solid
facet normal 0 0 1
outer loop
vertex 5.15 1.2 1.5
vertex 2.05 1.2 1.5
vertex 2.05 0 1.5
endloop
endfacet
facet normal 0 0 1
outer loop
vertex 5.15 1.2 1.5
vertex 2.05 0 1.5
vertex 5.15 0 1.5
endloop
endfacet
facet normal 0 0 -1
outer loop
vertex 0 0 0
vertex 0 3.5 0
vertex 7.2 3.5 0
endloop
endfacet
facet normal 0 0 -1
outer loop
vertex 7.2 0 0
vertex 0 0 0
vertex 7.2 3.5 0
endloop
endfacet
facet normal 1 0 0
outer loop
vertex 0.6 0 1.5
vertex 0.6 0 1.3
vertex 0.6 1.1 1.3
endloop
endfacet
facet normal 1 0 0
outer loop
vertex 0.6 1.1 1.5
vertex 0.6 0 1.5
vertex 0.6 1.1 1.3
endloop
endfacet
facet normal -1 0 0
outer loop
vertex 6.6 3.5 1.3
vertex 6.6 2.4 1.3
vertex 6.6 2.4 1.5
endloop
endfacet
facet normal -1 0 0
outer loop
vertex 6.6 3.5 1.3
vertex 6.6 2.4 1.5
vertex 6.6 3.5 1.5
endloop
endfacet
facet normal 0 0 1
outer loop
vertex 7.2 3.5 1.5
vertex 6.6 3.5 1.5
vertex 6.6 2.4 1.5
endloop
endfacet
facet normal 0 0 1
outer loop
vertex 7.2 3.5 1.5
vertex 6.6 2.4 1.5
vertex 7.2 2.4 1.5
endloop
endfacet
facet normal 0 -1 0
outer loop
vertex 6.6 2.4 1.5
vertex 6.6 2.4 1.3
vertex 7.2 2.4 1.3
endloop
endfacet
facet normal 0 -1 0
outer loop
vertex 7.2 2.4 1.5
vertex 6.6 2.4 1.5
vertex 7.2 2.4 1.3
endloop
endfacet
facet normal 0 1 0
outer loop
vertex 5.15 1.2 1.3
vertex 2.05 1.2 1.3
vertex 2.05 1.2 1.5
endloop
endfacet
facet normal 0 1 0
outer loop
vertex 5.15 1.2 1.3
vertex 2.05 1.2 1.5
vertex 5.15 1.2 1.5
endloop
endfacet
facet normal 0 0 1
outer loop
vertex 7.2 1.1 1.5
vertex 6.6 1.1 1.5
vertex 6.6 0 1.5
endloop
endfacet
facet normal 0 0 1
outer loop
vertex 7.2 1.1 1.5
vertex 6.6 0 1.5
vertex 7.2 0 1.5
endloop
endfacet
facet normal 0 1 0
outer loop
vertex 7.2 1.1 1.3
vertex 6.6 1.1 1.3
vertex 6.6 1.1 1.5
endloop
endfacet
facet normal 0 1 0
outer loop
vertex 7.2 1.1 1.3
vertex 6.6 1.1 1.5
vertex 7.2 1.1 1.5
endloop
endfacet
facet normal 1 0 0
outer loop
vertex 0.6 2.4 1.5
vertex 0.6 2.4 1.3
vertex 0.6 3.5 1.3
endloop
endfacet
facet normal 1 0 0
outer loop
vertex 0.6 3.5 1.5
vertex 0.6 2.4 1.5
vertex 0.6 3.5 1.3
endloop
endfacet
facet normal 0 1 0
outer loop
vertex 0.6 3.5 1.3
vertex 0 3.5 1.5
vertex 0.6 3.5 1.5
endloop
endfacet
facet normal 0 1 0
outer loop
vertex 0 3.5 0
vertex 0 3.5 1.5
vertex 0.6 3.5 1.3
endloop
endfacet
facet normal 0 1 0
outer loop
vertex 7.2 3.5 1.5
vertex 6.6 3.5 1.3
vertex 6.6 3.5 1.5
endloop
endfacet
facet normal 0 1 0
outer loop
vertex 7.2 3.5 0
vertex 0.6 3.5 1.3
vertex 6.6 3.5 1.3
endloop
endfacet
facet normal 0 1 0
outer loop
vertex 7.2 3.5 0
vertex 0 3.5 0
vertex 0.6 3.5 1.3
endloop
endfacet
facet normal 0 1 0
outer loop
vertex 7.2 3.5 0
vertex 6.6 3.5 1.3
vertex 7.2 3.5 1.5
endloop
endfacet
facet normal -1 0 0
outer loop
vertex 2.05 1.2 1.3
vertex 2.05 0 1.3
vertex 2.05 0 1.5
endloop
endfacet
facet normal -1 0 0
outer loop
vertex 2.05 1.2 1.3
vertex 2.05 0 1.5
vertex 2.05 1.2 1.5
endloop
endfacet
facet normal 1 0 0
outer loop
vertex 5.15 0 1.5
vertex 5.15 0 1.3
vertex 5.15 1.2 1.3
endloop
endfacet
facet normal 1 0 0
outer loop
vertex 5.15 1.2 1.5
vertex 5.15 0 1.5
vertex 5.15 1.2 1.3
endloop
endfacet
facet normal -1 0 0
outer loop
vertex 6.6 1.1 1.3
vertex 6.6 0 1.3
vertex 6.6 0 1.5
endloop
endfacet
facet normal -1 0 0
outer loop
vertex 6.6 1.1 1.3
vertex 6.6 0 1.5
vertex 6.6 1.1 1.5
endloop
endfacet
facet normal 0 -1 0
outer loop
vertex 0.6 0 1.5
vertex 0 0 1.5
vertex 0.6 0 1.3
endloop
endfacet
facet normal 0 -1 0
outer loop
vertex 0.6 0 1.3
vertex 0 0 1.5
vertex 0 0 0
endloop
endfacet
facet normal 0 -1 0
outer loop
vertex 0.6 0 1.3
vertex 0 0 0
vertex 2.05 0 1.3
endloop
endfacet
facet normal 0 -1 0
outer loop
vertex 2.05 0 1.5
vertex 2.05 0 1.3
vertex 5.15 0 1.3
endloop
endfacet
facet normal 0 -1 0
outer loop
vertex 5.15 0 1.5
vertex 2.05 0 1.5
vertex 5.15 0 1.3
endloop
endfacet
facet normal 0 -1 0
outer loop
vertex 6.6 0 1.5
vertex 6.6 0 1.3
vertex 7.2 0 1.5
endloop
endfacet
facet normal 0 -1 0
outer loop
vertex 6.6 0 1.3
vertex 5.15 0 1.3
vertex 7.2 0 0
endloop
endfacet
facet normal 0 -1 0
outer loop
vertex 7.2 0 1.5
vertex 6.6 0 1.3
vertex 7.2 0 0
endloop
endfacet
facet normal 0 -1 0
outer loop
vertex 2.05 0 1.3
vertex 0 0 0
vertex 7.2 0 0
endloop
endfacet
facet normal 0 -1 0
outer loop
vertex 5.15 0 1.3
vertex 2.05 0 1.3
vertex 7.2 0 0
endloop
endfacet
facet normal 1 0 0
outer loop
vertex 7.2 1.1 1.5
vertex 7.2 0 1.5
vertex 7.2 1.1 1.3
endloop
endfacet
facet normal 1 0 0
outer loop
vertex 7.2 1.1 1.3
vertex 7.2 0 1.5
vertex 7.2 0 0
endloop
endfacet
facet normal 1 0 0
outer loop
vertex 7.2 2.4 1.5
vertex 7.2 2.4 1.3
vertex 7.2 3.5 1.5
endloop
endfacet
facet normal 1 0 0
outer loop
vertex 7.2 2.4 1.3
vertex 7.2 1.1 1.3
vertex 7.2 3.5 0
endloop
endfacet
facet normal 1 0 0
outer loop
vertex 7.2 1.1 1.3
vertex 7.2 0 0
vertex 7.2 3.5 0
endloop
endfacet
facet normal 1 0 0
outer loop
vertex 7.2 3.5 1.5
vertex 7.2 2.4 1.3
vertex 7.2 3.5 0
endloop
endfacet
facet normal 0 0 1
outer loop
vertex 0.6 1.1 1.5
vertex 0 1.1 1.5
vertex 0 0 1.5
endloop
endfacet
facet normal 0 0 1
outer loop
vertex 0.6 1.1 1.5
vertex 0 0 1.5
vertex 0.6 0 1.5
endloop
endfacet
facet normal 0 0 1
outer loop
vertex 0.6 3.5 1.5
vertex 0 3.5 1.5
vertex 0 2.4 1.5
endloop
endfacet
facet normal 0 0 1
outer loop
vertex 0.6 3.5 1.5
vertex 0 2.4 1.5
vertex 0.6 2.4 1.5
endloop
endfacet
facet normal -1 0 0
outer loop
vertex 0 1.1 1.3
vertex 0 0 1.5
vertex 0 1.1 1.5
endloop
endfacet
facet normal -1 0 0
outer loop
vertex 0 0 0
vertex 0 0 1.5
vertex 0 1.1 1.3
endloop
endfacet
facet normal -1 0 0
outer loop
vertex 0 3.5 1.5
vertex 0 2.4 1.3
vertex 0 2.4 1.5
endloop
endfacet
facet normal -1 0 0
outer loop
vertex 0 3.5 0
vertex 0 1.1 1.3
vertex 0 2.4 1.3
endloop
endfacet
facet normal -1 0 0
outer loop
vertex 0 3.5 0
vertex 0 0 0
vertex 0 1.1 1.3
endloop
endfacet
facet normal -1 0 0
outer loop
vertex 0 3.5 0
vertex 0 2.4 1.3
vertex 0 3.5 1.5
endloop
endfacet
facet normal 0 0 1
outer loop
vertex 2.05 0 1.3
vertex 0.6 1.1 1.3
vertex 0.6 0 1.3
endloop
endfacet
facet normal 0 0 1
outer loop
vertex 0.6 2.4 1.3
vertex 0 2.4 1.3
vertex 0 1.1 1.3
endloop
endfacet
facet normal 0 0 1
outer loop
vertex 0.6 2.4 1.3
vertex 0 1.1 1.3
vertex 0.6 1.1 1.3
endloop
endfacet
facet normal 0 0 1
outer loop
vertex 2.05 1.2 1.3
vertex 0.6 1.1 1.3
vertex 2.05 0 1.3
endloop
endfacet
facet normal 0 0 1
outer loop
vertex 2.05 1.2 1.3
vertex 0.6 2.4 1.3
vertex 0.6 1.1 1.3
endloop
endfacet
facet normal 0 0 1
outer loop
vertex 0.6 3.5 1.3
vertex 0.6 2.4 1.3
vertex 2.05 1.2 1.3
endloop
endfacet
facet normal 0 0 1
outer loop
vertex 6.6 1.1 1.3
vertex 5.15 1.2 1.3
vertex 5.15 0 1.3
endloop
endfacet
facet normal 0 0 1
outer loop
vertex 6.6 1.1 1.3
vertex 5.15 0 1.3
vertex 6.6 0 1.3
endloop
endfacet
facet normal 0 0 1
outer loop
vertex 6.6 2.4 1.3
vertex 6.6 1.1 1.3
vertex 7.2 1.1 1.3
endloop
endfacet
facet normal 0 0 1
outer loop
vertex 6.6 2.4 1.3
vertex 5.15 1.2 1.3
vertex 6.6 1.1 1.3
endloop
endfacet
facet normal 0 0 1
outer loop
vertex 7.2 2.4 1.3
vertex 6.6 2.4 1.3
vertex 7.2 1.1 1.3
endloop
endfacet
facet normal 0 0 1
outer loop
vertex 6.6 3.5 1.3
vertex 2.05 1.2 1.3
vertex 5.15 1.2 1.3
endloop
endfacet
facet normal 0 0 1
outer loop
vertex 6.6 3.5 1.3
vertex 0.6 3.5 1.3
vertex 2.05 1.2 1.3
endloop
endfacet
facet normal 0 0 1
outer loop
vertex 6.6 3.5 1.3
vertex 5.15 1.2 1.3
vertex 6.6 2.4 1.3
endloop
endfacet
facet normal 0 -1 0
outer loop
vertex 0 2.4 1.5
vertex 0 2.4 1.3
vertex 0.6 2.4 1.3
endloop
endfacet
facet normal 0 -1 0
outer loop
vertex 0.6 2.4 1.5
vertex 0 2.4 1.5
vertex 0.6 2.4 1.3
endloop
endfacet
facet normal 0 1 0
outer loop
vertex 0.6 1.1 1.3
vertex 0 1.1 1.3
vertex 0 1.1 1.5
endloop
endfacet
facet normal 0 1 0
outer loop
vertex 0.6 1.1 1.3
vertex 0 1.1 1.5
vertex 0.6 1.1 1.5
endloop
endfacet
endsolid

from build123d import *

# Parameters (mm, degrees)
BOX024_W     = 3.1
BOX024_H     = 1.2
BOX024_DEPTH = 0.2
BOX023_W     = 0.6
BOX023_H     = 1.1
BOX023_DEPTH = 0.2
BOX022_W     = 0.6
BOX022_H     = 1.1
BOX022_DEPTH = 0.2
BOX021_W     = 0.6
BOX021_H     = 1.1
BOX021_DEPTH = 0.2
BOX020_W     = 0.6
BOX020_H     = 1.1
BOX020_DEPTH = 0.2
BOX025_W     = 7.2
BOX025_H     = 3.5
BOX025_DEPTH = 0.2
BOX_W        = 7.2
BOX_H        = 3.5
BOX_DEPTH    = 1.5


with BuildPart() as cube024:
    # Box024 → Box024 (new body)
    with BuildSketch(Plane(origin=(2.05, 0, 1.3), x_dir=(1, 0, 0), z_dir=(0, 0, 1))):
        with Locations((1.55, 0.6)):
            Rectangle(BOX024_W, BOX024_H)
    extrude(amount=BOX024_DEPTH)


with BuildPart() as cube023:
    # Box023 → Box023 (new body)
    with BuildSketch(Plane(origin=(0, 2.4, 1.3), x_dir=(1, 0, 0), z_dir=(0, 0, 1))):
        with Locations((0.3, 0.55)):
            Rectangle(BOX023_W, BOX023_H)
    extrude(amount=BOX023_DEPTH)


with BuildPart() as cube022:
    # Box022 → Box022 (new body)
    with BuildSketch(Plane.XY.offset(1.3)):
        with Locations((0.3, 0.55)):
            Rectangle(BOX022_W, BOX022_H)
    extrude(amount=BOX022_DEPTH)


with BuildPart() as cube021:
    # Box021 → Box021 (new body)
    with BuildSketch(Plane(origin=(6.6, 2.4, 1.3), x_dir=(1, 0, 0), z_dir=(0, 0, 1))):
        with Locations((0.3, 0.55)):
            Rectangle(BOX021_W, BOX021_H)
    extrude(amount=BOX021_DEPTH)


with BuildPart() as cube020:
    # Box020 → Box020 (new body)
    with BuildSketch(Plane(origin=(6.6, 0, 1.3), x_dir=(1, 0, 0), z_dir=(0, 0, 1))):
        with Locations((0.3, 0.55)):
            Rectangle(BOX020_W, BOX020_H)
    extrude(amount=BOX020_DEPTH)


with BuildPart() as silver_top001:
    # Box025 → Box025 (new body)
    with BuildSketch(Plane.XY.offset(1.3)):
        with Locations((3.6, 1.75)):
            Rectangle(BOX025_W, BOX025_H)
    extrude(amount=BOX025_DEPTH)

    # Cut005: cut Cube020
    add(cube020.part, mode=Mode.SUBTRACT)

    # Cut009: cut Cube021
    add(cube021.part, mode=Mode.SUBTRACT)

    # Cut006: cut Cube022
    add(cube022.part, mode=Mode.SUBTRACT)

    # Cut008: cut Cube023
    add(cube023.part, mode=Mode.SUBTRACT)

    # Cut007: cut Cube024
    add(cube024.part, mode=Mode.SUBTRACT)


with BuildPart() as plastic_body:
    # Box → Box (new body)
    with BuildSketch(Plane.XY):
        with Locations((3.6, 1.75)):
            Rectangle(BOX_W, BOX_H)
    extrude(amount=BOX_DEPTH)

    # Cut010: cut Silver Top001
    add(silver_top001.part, mode=Mode.SUBTRACT)


solid = plastic_body.part
